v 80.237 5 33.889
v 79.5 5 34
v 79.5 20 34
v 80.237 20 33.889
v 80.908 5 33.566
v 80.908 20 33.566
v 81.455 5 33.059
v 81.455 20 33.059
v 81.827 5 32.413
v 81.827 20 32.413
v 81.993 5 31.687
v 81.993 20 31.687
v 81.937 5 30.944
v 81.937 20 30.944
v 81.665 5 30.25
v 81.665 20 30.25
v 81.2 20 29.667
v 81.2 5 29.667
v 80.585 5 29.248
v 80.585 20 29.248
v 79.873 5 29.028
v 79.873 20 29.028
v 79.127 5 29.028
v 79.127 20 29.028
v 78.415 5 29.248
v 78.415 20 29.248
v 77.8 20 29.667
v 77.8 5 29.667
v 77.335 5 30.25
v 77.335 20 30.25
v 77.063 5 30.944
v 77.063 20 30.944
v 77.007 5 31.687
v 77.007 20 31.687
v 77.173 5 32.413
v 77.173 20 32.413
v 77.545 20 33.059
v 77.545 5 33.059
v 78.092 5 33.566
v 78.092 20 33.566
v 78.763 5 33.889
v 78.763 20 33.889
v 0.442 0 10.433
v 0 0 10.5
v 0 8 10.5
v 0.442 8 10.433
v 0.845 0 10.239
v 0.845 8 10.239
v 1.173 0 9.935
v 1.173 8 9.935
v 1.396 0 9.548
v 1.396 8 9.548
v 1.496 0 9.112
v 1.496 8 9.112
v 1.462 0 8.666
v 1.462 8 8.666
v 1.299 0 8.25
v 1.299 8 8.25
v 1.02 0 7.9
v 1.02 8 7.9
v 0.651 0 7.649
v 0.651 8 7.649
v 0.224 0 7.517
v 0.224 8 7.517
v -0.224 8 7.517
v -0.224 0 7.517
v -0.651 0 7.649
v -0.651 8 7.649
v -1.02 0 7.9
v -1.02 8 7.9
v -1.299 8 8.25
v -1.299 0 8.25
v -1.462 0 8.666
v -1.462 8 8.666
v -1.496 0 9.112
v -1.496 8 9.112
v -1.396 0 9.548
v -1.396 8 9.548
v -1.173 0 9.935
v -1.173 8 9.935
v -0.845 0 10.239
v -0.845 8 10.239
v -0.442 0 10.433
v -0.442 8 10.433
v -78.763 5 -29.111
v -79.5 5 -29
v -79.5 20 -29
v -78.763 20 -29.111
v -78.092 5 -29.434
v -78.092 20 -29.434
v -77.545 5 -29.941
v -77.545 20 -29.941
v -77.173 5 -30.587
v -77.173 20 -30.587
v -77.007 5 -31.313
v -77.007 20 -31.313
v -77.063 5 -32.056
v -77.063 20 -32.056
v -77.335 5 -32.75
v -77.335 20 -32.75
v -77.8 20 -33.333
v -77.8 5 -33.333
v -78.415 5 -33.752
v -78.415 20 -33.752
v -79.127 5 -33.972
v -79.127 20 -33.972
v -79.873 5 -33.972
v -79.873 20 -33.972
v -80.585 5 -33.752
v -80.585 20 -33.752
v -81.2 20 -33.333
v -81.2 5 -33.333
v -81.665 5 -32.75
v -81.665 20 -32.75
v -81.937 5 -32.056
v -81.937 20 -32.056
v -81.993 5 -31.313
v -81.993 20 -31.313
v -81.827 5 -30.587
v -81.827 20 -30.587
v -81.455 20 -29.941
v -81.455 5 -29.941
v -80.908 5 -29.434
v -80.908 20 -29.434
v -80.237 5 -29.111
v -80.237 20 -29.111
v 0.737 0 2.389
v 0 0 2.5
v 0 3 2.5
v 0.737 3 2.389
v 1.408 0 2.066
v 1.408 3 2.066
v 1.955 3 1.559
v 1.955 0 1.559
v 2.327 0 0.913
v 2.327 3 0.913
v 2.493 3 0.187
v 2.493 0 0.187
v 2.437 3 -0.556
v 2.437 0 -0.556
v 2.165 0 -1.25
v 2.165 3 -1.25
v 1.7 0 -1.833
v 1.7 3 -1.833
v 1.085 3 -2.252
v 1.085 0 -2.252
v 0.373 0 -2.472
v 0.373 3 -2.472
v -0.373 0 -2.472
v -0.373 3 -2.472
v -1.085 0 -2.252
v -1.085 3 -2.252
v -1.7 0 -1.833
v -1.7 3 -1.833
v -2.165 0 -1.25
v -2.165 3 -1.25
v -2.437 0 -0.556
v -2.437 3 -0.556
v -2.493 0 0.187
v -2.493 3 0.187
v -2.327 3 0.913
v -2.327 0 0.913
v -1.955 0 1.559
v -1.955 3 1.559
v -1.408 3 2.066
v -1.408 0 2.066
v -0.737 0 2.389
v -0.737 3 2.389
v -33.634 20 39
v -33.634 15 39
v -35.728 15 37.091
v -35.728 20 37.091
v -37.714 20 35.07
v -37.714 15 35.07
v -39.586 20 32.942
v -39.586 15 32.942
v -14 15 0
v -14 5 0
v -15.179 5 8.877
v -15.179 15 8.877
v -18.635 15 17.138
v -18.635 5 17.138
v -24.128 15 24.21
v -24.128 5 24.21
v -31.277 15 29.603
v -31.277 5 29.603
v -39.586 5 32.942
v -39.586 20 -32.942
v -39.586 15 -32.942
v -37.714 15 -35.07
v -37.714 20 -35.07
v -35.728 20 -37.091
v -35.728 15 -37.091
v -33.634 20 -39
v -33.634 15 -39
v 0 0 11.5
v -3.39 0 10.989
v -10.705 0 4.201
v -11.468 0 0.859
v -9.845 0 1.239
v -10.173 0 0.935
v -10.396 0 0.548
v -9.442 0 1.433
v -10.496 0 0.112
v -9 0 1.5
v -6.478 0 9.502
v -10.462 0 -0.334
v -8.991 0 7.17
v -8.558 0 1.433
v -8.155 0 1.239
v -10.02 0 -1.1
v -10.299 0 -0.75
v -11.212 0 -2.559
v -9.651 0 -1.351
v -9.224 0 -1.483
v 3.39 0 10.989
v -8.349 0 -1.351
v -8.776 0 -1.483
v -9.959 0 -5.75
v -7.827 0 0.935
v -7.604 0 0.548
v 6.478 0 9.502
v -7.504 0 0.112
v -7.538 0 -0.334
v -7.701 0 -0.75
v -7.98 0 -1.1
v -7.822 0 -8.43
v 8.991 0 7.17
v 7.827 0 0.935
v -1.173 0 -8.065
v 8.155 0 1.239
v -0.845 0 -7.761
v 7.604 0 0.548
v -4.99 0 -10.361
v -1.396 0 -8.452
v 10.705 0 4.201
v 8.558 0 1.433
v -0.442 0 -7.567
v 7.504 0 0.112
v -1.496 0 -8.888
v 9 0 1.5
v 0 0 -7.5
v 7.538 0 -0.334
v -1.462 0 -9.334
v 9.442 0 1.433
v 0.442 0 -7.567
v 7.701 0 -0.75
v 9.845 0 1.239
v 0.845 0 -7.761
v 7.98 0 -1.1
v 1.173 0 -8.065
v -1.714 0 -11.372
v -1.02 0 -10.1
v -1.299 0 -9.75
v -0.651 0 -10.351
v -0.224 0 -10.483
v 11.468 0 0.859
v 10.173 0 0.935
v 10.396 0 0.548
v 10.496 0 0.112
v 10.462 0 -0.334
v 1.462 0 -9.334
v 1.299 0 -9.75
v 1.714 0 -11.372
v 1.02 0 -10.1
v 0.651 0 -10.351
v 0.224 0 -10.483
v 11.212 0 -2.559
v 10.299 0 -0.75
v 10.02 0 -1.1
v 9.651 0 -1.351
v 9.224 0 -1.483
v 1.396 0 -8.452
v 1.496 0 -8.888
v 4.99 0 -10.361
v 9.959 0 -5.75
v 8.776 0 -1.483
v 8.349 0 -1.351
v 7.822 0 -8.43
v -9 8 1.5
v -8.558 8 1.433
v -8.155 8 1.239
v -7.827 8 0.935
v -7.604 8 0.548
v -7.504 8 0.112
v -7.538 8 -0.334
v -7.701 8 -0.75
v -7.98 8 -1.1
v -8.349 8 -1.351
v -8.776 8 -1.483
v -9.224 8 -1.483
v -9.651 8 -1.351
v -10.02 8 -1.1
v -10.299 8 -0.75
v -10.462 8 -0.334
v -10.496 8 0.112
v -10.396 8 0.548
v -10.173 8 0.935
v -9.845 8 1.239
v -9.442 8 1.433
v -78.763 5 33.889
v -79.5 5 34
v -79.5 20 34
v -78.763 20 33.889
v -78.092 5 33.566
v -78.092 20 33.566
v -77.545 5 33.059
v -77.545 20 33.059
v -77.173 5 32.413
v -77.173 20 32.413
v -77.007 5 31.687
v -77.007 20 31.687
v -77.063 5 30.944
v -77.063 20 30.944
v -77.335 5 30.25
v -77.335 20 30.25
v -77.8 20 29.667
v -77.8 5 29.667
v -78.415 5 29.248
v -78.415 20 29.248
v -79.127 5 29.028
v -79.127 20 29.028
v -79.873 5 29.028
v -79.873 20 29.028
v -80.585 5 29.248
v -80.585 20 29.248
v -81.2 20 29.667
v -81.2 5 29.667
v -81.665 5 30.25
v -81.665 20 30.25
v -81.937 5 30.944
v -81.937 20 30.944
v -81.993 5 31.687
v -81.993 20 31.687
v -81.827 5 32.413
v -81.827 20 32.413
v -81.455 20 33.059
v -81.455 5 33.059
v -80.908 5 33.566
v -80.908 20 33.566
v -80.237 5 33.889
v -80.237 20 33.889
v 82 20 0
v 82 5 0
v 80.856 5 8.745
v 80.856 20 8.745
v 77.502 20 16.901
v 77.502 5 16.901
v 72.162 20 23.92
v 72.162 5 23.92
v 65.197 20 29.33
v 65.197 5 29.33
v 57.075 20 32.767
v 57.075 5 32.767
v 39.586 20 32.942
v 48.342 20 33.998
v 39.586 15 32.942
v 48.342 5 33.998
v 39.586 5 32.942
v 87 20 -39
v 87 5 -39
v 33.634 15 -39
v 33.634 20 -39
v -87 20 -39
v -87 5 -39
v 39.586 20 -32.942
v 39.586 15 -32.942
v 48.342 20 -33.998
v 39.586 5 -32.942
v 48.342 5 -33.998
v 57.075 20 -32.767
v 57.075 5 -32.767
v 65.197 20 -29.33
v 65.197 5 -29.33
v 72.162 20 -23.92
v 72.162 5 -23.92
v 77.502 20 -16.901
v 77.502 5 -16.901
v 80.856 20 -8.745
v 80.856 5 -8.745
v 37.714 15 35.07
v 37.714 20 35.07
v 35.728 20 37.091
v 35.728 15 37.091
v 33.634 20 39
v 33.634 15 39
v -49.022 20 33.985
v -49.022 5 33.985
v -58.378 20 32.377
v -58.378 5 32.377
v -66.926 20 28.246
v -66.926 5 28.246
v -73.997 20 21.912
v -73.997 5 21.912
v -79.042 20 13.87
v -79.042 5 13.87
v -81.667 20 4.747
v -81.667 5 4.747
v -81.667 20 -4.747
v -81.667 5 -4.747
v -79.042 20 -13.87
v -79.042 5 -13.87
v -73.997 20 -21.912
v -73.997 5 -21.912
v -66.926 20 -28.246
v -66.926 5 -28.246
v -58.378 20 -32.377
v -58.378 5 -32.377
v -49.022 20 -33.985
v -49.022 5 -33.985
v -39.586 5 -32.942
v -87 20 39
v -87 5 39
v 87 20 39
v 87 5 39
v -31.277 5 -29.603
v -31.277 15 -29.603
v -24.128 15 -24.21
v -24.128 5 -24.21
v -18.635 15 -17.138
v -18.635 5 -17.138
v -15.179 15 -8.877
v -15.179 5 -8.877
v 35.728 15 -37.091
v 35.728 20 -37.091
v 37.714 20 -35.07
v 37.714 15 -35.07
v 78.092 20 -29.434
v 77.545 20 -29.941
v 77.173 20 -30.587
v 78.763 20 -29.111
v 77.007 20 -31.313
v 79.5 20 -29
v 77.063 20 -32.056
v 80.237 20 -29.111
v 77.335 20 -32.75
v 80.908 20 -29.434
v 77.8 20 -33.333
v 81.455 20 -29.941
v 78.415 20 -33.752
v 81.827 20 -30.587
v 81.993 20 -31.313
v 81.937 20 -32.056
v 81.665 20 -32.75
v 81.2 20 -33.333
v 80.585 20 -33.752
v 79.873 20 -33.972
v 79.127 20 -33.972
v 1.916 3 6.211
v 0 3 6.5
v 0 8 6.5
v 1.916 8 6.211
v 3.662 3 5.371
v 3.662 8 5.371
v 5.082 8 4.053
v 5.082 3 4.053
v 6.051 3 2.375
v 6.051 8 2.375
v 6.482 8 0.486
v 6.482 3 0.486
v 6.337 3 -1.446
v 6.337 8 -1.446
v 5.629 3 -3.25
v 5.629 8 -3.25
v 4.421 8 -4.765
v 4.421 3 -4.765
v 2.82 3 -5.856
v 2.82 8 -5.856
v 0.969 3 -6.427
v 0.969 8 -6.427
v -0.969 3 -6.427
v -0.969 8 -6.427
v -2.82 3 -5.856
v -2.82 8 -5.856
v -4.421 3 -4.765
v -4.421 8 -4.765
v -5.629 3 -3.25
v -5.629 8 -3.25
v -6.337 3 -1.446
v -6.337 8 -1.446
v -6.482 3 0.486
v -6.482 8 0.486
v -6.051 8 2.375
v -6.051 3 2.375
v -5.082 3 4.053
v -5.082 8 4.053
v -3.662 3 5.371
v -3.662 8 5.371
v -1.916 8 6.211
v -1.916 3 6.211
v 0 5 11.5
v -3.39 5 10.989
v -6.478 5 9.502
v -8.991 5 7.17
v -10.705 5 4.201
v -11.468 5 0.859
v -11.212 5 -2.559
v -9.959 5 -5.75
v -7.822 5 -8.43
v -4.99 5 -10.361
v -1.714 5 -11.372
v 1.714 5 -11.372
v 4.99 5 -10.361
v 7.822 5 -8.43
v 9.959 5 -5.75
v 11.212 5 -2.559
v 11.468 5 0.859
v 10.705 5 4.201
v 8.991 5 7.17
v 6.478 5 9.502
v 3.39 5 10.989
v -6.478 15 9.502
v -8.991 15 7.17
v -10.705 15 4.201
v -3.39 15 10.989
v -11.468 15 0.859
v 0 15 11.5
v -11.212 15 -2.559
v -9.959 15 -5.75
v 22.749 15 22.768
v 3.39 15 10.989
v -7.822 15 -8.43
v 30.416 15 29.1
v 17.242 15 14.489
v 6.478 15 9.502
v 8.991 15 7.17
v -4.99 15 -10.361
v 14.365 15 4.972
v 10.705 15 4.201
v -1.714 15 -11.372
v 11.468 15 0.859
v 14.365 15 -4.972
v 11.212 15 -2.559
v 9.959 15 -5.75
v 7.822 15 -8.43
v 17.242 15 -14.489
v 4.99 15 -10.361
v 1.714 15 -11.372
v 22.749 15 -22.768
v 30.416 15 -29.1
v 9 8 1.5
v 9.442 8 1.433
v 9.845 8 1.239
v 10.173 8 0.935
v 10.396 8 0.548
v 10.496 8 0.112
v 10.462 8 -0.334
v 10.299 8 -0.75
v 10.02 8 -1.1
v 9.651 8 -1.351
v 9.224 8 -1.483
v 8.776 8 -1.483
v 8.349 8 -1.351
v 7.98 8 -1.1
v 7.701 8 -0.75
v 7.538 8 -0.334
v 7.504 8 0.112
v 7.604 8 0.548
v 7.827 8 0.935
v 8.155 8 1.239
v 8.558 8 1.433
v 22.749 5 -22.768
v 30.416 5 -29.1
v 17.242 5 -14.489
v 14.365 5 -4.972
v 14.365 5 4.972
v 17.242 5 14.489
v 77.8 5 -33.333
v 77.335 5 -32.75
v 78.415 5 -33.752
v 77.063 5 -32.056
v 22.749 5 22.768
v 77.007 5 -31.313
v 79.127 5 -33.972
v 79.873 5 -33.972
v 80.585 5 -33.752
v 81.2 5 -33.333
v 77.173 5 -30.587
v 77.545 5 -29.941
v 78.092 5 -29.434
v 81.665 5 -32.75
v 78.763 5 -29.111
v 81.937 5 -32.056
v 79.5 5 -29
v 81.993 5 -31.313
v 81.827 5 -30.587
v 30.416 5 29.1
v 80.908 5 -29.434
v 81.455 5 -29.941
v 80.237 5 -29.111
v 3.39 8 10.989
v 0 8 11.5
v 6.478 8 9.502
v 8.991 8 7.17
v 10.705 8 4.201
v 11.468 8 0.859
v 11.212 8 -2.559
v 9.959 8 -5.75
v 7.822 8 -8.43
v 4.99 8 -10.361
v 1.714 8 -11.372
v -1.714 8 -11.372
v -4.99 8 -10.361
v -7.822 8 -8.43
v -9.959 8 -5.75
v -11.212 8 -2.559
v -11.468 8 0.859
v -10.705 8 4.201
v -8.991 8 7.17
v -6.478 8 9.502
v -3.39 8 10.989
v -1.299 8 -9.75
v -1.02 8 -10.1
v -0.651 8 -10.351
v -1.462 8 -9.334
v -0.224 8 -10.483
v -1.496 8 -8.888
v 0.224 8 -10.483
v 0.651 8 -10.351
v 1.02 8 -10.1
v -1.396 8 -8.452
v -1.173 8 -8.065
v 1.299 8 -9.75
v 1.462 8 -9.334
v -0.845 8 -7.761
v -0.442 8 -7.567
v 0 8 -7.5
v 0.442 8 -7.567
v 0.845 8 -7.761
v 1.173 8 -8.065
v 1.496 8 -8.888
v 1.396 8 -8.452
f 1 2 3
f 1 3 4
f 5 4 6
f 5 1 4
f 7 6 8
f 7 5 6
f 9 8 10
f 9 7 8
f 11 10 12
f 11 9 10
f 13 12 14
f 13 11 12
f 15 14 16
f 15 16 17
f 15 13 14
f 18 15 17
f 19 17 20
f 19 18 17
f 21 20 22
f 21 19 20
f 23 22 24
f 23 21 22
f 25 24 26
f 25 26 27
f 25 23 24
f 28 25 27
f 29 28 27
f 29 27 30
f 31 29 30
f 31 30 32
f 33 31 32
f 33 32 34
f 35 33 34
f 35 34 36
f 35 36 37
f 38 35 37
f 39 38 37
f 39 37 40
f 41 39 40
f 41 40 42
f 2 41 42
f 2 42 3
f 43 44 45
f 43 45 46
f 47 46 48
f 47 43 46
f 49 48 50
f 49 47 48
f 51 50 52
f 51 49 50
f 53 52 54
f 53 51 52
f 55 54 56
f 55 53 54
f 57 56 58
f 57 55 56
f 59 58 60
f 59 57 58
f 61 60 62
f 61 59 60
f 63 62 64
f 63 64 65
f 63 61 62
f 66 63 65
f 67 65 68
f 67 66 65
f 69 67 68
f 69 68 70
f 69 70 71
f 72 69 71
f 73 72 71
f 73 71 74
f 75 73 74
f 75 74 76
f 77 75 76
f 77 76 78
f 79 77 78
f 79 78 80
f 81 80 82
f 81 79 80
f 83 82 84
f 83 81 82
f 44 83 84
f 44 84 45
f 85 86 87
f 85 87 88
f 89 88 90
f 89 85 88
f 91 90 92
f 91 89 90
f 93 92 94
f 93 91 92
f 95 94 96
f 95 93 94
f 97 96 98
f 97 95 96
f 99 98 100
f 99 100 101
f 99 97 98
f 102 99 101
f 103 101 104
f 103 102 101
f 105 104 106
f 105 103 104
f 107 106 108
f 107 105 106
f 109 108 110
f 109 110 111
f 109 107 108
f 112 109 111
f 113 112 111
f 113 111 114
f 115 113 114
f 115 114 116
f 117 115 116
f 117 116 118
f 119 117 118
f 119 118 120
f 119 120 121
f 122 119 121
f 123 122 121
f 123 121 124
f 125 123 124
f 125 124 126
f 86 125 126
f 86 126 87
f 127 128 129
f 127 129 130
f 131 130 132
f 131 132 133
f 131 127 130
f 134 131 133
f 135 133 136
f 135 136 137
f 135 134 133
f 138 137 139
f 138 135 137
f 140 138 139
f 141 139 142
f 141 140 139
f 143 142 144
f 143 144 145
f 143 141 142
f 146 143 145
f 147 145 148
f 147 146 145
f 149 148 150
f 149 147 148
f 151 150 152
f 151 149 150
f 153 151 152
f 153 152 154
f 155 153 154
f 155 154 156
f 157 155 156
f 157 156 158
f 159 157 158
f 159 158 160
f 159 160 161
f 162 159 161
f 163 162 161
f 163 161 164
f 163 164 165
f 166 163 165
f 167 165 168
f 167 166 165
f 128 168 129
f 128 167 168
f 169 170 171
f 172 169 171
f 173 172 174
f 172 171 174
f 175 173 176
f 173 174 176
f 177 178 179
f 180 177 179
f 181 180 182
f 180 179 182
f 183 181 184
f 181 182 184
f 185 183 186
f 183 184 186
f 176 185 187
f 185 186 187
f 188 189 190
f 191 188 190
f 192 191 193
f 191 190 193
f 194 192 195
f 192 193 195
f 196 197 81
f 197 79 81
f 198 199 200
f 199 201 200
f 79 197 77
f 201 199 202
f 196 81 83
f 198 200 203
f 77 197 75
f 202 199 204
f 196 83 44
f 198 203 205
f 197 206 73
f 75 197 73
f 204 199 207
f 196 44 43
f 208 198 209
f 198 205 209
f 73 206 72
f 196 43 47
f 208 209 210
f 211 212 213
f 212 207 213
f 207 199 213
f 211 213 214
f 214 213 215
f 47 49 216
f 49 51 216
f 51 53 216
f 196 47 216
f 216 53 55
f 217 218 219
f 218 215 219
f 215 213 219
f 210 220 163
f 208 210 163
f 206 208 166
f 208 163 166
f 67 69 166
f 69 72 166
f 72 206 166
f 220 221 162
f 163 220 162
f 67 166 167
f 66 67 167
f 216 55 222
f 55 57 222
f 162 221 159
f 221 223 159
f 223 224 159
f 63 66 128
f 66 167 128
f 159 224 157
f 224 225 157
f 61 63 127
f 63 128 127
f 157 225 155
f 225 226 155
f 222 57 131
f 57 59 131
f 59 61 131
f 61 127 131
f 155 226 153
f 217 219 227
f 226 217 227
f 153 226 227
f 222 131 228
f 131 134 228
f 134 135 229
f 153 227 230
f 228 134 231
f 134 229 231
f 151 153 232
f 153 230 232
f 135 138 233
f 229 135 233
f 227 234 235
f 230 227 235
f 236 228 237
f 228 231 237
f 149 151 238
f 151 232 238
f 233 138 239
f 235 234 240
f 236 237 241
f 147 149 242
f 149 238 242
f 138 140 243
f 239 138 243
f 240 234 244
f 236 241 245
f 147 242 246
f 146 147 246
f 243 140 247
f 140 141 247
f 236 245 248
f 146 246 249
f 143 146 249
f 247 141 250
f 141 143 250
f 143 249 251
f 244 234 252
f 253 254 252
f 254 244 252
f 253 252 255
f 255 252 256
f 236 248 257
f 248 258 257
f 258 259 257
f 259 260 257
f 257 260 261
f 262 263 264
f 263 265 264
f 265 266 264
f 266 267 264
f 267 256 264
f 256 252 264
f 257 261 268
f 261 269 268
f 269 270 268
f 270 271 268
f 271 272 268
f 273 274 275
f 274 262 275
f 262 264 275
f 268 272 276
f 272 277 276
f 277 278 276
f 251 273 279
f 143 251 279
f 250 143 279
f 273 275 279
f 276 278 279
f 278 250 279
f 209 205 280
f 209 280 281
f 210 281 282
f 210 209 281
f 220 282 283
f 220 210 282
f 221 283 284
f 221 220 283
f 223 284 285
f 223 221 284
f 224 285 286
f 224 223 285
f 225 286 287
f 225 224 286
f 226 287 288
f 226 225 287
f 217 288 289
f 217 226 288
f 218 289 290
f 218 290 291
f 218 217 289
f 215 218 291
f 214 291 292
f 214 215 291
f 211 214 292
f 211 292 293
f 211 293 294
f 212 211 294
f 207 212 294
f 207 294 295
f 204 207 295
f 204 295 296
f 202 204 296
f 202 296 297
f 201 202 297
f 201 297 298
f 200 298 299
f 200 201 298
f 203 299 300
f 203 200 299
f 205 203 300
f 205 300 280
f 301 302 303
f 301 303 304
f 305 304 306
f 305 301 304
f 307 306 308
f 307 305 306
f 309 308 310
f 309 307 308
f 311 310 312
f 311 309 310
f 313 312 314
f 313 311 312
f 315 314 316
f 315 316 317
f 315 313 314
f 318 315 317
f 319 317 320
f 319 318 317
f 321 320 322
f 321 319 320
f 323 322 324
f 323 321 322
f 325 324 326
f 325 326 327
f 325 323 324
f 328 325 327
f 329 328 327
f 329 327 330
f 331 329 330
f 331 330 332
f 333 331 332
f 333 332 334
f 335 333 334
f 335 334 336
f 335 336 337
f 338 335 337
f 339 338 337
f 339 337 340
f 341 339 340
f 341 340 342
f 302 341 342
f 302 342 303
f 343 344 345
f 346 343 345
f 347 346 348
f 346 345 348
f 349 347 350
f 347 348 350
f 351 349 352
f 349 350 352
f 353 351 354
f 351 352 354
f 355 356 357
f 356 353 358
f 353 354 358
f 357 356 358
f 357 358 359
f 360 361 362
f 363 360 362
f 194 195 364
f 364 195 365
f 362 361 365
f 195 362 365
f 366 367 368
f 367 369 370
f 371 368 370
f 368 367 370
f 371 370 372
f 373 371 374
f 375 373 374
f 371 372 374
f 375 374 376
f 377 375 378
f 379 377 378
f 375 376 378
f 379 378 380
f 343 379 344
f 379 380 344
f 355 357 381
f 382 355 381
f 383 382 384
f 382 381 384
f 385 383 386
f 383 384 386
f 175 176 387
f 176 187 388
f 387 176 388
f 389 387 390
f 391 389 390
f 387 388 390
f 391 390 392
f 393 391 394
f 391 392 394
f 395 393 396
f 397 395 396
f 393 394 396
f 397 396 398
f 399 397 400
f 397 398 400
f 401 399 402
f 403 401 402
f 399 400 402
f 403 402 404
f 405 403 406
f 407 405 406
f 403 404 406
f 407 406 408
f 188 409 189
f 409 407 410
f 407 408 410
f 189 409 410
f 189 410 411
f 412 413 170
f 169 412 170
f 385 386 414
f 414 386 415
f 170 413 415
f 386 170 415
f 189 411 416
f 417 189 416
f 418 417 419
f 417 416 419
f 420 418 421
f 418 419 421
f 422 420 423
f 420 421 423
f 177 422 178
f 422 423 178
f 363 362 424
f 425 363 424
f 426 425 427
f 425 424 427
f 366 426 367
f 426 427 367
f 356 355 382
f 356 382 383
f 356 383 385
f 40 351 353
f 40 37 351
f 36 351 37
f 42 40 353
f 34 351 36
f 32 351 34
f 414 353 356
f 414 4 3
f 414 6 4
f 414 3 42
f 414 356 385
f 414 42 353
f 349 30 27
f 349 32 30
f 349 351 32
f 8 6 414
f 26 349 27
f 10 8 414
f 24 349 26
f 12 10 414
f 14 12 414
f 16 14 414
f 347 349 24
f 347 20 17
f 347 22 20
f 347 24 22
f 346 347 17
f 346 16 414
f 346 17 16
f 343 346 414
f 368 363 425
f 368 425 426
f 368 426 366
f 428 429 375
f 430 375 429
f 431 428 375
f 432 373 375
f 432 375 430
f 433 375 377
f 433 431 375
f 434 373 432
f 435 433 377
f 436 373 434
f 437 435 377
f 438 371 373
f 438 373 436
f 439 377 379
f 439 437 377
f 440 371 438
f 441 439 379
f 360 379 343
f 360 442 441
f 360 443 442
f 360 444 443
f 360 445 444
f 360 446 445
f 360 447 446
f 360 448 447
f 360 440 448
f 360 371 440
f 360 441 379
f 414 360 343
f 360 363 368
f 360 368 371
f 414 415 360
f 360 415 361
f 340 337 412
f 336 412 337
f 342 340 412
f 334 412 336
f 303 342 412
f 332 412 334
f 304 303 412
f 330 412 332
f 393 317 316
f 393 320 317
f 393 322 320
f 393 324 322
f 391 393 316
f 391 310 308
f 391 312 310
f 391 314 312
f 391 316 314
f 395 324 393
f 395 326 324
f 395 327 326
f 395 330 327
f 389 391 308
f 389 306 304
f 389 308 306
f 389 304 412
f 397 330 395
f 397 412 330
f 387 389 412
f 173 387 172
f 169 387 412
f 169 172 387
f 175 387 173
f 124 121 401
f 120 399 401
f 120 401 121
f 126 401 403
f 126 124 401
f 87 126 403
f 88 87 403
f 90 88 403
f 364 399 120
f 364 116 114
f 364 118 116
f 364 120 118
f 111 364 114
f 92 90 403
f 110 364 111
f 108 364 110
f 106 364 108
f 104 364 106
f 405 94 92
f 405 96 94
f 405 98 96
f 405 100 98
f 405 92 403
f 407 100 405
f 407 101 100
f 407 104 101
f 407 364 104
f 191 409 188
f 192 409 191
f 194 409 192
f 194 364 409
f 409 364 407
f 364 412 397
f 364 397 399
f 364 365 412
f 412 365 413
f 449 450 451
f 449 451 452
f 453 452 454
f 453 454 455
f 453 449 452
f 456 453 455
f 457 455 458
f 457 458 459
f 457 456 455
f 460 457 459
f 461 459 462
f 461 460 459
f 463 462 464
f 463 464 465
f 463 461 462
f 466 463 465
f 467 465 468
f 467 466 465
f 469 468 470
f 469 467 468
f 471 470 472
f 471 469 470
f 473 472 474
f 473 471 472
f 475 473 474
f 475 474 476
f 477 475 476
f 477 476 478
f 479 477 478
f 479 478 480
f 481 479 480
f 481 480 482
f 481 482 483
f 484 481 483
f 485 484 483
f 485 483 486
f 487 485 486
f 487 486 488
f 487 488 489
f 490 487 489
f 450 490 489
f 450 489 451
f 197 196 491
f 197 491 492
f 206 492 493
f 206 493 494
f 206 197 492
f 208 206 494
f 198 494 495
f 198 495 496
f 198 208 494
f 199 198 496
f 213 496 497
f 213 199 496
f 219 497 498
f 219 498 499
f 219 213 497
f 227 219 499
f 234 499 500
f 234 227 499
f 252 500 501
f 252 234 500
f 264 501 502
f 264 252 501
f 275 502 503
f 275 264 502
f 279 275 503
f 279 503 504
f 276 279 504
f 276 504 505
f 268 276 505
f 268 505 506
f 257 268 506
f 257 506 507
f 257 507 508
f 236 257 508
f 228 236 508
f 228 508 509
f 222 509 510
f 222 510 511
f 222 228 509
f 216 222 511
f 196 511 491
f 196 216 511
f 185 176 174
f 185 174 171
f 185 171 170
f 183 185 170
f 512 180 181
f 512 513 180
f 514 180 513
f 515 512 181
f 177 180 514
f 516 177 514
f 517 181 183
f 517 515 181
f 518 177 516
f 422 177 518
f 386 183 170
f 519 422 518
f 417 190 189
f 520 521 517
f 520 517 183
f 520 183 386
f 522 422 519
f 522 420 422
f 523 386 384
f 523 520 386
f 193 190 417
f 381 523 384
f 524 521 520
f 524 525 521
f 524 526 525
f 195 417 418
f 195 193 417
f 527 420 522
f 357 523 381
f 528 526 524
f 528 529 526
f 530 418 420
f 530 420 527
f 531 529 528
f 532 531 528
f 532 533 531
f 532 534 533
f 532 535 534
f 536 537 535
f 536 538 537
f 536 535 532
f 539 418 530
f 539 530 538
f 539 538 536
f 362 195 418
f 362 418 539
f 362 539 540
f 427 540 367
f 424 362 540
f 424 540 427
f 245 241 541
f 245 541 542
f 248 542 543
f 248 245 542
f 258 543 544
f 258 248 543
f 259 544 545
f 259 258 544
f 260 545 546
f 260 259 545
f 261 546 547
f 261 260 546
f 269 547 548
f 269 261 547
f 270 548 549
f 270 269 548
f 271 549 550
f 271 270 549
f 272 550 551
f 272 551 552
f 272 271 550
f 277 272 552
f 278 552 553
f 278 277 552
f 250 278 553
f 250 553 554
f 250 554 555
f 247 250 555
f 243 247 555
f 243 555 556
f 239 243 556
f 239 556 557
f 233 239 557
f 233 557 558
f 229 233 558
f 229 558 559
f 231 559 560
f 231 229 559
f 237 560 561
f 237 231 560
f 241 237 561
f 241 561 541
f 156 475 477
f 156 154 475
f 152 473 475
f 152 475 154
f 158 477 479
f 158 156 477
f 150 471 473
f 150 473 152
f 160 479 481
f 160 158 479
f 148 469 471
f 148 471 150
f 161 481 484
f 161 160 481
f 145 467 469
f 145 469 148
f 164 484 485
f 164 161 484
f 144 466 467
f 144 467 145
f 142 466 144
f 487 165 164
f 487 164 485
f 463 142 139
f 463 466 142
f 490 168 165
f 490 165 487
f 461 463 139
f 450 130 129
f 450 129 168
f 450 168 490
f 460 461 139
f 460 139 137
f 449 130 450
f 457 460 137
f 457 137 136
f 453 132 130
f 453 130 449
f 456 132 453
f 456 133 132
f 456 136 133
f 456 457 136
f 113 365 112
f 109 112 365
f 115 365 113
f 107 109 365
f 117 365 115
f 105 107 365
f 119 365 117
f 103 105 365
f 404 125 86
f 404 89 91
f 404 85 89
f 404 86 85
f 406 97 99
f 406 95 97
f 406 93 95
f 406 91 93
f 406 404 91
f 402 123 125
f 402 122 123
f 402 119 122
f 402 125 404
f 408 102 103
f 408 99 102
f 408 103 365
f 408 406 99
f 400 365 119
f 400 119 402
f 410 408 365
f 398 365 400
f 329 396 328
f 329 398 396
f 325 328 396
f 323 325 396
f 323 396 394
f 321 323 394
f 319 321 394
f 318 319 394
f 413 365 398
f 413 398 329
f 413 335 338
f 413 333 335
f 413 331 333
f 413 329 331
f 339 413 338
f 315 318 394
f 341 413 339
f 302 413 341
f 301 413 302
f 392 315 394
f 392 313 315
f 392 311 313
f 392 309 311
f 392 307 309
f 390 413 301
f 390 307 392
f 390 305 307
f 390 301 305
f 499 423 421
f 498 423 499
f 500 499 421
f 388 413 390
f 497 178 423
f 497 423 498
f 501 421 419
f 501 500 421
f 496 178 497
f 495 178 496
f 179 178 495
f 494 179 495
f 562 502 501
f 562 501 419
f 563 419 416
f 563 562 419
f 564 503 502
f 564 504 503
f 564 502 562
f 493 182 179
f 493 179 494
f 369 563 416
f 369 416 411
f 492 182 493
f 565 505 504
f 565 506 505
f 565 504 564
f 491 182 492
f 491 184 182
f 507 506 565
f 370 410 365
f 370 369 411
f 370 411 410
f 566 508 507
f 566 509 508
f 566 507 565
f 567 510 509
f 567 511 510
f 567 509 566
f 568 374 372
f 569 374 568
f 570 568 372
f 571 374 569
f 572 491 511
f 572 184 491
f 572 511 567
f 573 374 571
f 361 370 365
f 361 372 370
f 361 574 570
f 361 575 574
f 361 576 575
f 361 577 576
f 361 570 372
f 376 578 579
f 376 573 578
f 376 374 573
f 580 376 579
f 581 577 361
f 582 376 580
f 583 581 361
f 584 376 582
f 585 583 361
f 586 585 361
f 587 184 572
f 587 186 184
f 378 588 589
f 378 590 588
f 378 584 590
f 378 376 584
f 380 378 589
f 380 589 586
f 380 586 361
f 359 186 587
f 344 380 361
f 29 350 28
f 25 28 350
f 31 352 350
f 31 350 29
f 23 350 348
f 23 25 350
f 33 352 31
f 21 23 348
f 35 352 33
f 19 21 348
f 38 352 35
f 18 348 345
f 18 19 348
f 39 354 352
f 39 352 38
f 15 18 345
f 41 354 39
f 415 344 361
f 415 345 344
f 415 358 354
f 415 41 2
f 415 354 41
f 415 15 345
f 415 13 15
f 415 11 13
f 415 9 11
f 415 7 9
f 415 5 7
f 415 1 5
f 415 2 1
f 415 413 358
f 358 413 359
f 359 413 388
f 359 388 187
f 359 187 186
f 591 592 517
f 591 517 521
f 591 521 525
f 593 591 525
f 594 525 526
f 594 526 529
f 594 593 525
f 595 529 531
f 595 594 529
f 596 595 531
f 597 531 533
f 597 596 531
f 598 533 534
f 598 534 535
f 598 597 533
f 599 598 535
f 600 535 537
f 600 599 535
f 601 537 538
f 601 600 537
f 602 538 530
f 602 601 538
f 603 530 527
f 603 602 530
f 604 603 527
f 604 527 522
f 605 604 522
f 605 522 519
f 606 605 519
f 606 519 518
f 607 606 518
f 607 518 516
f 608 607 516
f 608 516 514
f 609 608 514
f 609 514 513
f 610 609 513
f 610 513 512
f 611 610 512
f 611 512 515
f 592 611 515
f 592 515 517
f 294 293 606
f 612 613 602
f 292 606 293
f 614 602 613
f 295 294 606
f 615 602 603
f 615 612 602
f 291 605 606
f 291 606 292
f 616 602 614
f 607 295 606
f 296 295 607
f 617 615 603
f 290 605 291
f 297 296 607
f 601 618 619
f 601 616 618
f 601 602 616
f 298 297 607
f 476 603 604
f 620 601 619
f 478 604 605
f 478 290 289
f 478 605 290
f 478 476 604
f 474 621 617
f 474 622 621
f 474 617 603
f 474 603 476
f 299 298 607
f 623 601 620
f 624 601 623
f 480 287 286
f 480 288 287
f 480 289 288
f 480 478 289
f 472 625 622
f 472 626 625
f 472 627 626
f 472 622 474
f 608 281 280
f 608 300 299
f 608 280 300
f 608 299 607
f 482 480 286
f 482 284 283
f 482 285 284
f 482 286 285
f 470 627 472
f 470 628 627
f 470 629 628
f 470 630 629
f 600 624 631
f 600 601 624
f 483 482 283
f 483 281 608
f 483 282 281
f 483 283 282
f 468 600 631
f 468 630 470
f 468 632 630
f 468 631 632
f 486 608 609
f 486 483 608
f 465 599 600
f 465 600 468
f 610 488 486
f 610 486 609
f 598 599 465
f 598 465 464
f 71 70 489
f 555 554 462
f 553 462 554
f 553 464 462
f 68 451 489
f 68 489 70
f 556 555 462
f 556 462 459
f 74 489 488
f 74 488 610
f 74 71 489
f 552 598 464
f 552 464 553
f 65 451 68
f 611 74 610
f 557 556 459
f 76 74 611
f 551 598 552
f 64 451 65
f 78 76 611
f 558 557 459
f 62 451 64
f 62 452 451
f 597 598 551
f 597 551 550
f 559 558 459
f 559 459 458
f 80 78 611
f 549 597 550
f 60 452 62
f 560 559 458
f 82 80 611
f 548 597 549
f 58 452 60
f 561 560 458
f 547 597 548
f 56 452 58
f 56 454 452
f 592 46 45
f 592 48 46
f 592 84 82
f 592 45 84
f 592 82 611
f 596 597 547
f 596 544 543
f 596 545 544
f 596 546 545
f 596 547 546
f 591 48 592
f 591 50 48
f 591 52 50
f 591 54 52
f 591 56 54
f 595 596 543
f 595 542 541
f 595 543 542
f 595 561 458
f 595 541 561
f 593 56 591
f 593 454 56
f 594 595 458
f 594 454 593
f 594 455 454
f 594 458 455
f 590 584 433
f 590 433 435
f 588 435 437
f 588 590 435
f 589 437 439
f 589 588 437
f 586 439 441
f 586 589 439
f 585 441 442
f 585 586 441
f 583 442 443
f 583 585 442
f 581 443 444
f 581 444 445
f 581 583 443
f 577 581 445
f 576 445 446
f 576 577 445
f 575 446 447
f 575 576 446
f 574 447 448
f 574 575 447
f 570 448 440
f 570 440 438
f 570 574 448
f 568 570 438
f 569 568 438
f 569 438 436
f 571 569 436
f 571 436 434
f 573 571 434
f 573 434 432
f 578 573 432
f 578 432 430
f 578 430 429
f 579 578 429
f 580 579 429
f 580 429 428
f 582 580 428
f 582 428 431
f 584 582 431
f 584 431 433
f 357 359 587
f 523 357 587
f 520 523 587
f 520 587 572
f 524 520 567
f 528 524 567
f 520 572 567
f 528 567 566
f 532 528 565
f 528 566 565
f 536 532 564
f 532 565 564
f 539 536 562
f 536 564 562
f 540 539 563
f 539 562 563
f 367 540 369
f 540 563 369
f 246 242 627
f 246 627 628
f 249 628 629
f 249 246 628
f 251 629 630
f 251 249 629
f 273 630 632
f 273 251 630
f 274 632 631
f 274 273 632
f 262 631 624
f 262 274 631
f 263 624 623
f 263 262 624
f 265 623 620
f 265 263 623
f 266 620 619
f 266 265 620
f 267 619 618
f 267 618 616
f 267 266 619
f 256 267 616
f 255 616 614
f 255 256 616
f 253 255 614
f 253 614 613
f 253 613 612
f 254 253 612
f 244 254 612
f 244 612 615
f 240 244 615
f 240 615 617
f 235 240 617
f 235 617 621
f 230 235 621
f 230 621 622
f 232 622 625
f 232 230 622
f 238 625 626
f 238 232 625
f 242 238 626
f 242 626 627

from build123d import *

# Parameters (mm, degrees)
SKETCH1_R           = 6.5
SKETCH1_R_2         = 2.5
BOSS_EXTRUDE1_DEPTH = 3
SKETCH1_3_R         = 11.5
SKETCH1_3_R_2       = 1.5
SKETCH1_3_R_3       = 6.5
BOSS_EXTRUDE2_DEPTH = 8
SKETCH1_4_R         = 11.5
BOSS_EXTRUDE3_DEPTH = 15
SKETCH1_5_R         = 2.5
BOSS_EXTRUDE4_DEPTH = 20
SKETCH3_W           = 174
SKETCH3_H           = 78
SKETCH3_R           = 11.5
CUT_EXTRUDE1_DEPTH  = 5


with BuildPart() as part:
    # Sketch1 → Boss-Extrude1 (new body)
    with BuildSketch(Plane(origin=(0, 0, 0), x_dir=(1, 0, 0), z_dir=(0, 1, 0))):
        Circle(SKETCH1_R)
        Circle(SKETCH1_R_2, mode=Mode.SUBTRACT)
    extrude(amount=BOSS_EXTRUDE1_DEPTH)



with BuildPart() as body_2:
    # Sketch1<3> → Boss-Extrude2 (new body)
    with BuildSketch(Plane(origin=(0, 0, 0), x_dir=(1, 0, 0), z_dir=(0, 1, 0))):
        Circle(SKETCH1_3_R)
        with Locations((-9, 0)):
            Circle(SKETCH1_3_R_2, mode=Mode.SUBTRACT)
        with Locations((0, -9)):
            Circle(SKETCH1_3_R_2, mode=Mode.SUBTRACT)
        Circle(SKETCH1_3_R_3, mode=Mode.SUBTRACT)
        with Locations((9, 0)):
            Circle(SKETCH1_3_R_2, mode=Mode.SUBTRACT)
        with Locations((0, 9)):
            Circle(SKETCH1_3_R_2, mode=Mode.SUBTRACT)
    extrude(amount=BOSS_EXTRUDE2_DEPTH)


with BuildPart() as part_1:
    add(part.part)

    add(body_2.part)  # Boss-Extrude3 merges body 2
    # Sketch1<4> → Boss-Extrude3 (add)
    with BuildSketch(Plane(origin=(0, 0, 0), x_dir=(1, 0, 0), z_dir=(0, 1, 0))):
        with BuildLine():
            ThreePointArc((39.5859375, 32.942427844), (36.735072586, 36.094105365), (33.634060118, 39))
            Line((33.634060118, 39), (-33.634060118, 39))
            ThreePointArc((-33.634060118, 39), (-36.735072586, 36.094105365), (-39.5859375, 32.942427844))
            ThreePointArc((-39.5859375, 32.942427844), (-21.147829464, 20.855717142), (-14, 0))
            ThreePointArc((-14, 0), (-21.147829464, -20.855717142), (-39.5859375, -32.942427844))
            ThreePointArc((-39.5859375, -32.942427844), (-36.735072586, -36.094105365), (-33.634060118, -39))
            Line((-33.634060118, -39), (33.634060118, -39))
            ThreePointArc((33.634060118, -39), (36.735072586, -36.094105365), (39.5859375, -32.942427844))
            ThreePointArc((39.5859375, -32.942427844), (14, 0), (39.5859375, 32.942427844))
        make_face()
        Circle(SKETCH1_4_R, mode=Mode.SUBTRACT)
    extrude(amount=BOSS_EXTRUDE3_DEPTH)

    # Sketch1<5> → Boss-Extrude4 (add)
    # profile 1 of 2: a face of its own
    with BuildSketch(Plane(origin=(0, 0, 0), x_dir=(1, 0, 0), z_dir=(0, 1, 0))):
        with BuildLine():
            Line((87, -39), (87, 39))
            Line((87, 39), (33.634060118, 39))
            ThreePointArc((33.634060118, 39), (36.735072586, 36.094105365), (39.5859375, 32.942427844))
            ThreePointArc((39.5859375, 32.942427844), (82, 0), (39.5859375, -32.942427844))
            ThreePointArc((39.5859375, -32.942427844), (36.735072586, -36.094105365), (33.634060118, -39))
            Line((33.634060118, -39), (87, -39))
        make_face()
        with Locations((79.5, -31.5)):
            Circle(SKETCH1_5_R, mode=Mode.SUBTRACT)
        with Locations((79.5, 31.5)):
            Circle(SKETCH1_5_R, mode=Mode.SUBTRACT)
    # profile 2 of 2: a face of its own
    with BuildSketch(Plane(origin=(0, 0, 0), x_dir=(1, 0, 0), z_dir=(0, 1, 0))):
        with BuildLine():
            ThreePointArc((-39.5859375, 32.942427844), (-36.735072586, 36.094105365), (-33.634060118, 39))
            Line((-33.634060118, 39), (-87, 39))
            Line((-87, 39), (-87, -39))
            Line((-87, -39), (-33.634060118, -39))
            ThreePointArc((-33.634060118, -39), (-36.735072586, -36.094105365), (-39.5859375, -32.942427844))
            ThreePointArc((-39.5859375, -32.942427844), (-82, 0), (-39.5859375, 32.942427844))
        make_face()
        with Locations((-79.5, -31.5)):
            Circle(SKETCH1_5_R, mode=Mode.SUBTRACT)
        with Locations((-79.5, 31.5)):
            Circle(SKETCH1_5_R, mode=Mode.SUBTRACT)
    extrude(amount=BOSS_EXTRUDE4_DEPTH)

    # Sketch3 → Cut-Extrude1 (cut)
    with BuildSketch(Plane.XZ):
        Rectangle(SKETCH3_W, SKETCH3_H)
        Circle(SKETCH3_R, mode=Mode.SUBTRACT)
    extrude(amount=-CUT_EXTRUDE1_DEPTH, mode=Mode.SUBTRACT)


solid = part_1.part
